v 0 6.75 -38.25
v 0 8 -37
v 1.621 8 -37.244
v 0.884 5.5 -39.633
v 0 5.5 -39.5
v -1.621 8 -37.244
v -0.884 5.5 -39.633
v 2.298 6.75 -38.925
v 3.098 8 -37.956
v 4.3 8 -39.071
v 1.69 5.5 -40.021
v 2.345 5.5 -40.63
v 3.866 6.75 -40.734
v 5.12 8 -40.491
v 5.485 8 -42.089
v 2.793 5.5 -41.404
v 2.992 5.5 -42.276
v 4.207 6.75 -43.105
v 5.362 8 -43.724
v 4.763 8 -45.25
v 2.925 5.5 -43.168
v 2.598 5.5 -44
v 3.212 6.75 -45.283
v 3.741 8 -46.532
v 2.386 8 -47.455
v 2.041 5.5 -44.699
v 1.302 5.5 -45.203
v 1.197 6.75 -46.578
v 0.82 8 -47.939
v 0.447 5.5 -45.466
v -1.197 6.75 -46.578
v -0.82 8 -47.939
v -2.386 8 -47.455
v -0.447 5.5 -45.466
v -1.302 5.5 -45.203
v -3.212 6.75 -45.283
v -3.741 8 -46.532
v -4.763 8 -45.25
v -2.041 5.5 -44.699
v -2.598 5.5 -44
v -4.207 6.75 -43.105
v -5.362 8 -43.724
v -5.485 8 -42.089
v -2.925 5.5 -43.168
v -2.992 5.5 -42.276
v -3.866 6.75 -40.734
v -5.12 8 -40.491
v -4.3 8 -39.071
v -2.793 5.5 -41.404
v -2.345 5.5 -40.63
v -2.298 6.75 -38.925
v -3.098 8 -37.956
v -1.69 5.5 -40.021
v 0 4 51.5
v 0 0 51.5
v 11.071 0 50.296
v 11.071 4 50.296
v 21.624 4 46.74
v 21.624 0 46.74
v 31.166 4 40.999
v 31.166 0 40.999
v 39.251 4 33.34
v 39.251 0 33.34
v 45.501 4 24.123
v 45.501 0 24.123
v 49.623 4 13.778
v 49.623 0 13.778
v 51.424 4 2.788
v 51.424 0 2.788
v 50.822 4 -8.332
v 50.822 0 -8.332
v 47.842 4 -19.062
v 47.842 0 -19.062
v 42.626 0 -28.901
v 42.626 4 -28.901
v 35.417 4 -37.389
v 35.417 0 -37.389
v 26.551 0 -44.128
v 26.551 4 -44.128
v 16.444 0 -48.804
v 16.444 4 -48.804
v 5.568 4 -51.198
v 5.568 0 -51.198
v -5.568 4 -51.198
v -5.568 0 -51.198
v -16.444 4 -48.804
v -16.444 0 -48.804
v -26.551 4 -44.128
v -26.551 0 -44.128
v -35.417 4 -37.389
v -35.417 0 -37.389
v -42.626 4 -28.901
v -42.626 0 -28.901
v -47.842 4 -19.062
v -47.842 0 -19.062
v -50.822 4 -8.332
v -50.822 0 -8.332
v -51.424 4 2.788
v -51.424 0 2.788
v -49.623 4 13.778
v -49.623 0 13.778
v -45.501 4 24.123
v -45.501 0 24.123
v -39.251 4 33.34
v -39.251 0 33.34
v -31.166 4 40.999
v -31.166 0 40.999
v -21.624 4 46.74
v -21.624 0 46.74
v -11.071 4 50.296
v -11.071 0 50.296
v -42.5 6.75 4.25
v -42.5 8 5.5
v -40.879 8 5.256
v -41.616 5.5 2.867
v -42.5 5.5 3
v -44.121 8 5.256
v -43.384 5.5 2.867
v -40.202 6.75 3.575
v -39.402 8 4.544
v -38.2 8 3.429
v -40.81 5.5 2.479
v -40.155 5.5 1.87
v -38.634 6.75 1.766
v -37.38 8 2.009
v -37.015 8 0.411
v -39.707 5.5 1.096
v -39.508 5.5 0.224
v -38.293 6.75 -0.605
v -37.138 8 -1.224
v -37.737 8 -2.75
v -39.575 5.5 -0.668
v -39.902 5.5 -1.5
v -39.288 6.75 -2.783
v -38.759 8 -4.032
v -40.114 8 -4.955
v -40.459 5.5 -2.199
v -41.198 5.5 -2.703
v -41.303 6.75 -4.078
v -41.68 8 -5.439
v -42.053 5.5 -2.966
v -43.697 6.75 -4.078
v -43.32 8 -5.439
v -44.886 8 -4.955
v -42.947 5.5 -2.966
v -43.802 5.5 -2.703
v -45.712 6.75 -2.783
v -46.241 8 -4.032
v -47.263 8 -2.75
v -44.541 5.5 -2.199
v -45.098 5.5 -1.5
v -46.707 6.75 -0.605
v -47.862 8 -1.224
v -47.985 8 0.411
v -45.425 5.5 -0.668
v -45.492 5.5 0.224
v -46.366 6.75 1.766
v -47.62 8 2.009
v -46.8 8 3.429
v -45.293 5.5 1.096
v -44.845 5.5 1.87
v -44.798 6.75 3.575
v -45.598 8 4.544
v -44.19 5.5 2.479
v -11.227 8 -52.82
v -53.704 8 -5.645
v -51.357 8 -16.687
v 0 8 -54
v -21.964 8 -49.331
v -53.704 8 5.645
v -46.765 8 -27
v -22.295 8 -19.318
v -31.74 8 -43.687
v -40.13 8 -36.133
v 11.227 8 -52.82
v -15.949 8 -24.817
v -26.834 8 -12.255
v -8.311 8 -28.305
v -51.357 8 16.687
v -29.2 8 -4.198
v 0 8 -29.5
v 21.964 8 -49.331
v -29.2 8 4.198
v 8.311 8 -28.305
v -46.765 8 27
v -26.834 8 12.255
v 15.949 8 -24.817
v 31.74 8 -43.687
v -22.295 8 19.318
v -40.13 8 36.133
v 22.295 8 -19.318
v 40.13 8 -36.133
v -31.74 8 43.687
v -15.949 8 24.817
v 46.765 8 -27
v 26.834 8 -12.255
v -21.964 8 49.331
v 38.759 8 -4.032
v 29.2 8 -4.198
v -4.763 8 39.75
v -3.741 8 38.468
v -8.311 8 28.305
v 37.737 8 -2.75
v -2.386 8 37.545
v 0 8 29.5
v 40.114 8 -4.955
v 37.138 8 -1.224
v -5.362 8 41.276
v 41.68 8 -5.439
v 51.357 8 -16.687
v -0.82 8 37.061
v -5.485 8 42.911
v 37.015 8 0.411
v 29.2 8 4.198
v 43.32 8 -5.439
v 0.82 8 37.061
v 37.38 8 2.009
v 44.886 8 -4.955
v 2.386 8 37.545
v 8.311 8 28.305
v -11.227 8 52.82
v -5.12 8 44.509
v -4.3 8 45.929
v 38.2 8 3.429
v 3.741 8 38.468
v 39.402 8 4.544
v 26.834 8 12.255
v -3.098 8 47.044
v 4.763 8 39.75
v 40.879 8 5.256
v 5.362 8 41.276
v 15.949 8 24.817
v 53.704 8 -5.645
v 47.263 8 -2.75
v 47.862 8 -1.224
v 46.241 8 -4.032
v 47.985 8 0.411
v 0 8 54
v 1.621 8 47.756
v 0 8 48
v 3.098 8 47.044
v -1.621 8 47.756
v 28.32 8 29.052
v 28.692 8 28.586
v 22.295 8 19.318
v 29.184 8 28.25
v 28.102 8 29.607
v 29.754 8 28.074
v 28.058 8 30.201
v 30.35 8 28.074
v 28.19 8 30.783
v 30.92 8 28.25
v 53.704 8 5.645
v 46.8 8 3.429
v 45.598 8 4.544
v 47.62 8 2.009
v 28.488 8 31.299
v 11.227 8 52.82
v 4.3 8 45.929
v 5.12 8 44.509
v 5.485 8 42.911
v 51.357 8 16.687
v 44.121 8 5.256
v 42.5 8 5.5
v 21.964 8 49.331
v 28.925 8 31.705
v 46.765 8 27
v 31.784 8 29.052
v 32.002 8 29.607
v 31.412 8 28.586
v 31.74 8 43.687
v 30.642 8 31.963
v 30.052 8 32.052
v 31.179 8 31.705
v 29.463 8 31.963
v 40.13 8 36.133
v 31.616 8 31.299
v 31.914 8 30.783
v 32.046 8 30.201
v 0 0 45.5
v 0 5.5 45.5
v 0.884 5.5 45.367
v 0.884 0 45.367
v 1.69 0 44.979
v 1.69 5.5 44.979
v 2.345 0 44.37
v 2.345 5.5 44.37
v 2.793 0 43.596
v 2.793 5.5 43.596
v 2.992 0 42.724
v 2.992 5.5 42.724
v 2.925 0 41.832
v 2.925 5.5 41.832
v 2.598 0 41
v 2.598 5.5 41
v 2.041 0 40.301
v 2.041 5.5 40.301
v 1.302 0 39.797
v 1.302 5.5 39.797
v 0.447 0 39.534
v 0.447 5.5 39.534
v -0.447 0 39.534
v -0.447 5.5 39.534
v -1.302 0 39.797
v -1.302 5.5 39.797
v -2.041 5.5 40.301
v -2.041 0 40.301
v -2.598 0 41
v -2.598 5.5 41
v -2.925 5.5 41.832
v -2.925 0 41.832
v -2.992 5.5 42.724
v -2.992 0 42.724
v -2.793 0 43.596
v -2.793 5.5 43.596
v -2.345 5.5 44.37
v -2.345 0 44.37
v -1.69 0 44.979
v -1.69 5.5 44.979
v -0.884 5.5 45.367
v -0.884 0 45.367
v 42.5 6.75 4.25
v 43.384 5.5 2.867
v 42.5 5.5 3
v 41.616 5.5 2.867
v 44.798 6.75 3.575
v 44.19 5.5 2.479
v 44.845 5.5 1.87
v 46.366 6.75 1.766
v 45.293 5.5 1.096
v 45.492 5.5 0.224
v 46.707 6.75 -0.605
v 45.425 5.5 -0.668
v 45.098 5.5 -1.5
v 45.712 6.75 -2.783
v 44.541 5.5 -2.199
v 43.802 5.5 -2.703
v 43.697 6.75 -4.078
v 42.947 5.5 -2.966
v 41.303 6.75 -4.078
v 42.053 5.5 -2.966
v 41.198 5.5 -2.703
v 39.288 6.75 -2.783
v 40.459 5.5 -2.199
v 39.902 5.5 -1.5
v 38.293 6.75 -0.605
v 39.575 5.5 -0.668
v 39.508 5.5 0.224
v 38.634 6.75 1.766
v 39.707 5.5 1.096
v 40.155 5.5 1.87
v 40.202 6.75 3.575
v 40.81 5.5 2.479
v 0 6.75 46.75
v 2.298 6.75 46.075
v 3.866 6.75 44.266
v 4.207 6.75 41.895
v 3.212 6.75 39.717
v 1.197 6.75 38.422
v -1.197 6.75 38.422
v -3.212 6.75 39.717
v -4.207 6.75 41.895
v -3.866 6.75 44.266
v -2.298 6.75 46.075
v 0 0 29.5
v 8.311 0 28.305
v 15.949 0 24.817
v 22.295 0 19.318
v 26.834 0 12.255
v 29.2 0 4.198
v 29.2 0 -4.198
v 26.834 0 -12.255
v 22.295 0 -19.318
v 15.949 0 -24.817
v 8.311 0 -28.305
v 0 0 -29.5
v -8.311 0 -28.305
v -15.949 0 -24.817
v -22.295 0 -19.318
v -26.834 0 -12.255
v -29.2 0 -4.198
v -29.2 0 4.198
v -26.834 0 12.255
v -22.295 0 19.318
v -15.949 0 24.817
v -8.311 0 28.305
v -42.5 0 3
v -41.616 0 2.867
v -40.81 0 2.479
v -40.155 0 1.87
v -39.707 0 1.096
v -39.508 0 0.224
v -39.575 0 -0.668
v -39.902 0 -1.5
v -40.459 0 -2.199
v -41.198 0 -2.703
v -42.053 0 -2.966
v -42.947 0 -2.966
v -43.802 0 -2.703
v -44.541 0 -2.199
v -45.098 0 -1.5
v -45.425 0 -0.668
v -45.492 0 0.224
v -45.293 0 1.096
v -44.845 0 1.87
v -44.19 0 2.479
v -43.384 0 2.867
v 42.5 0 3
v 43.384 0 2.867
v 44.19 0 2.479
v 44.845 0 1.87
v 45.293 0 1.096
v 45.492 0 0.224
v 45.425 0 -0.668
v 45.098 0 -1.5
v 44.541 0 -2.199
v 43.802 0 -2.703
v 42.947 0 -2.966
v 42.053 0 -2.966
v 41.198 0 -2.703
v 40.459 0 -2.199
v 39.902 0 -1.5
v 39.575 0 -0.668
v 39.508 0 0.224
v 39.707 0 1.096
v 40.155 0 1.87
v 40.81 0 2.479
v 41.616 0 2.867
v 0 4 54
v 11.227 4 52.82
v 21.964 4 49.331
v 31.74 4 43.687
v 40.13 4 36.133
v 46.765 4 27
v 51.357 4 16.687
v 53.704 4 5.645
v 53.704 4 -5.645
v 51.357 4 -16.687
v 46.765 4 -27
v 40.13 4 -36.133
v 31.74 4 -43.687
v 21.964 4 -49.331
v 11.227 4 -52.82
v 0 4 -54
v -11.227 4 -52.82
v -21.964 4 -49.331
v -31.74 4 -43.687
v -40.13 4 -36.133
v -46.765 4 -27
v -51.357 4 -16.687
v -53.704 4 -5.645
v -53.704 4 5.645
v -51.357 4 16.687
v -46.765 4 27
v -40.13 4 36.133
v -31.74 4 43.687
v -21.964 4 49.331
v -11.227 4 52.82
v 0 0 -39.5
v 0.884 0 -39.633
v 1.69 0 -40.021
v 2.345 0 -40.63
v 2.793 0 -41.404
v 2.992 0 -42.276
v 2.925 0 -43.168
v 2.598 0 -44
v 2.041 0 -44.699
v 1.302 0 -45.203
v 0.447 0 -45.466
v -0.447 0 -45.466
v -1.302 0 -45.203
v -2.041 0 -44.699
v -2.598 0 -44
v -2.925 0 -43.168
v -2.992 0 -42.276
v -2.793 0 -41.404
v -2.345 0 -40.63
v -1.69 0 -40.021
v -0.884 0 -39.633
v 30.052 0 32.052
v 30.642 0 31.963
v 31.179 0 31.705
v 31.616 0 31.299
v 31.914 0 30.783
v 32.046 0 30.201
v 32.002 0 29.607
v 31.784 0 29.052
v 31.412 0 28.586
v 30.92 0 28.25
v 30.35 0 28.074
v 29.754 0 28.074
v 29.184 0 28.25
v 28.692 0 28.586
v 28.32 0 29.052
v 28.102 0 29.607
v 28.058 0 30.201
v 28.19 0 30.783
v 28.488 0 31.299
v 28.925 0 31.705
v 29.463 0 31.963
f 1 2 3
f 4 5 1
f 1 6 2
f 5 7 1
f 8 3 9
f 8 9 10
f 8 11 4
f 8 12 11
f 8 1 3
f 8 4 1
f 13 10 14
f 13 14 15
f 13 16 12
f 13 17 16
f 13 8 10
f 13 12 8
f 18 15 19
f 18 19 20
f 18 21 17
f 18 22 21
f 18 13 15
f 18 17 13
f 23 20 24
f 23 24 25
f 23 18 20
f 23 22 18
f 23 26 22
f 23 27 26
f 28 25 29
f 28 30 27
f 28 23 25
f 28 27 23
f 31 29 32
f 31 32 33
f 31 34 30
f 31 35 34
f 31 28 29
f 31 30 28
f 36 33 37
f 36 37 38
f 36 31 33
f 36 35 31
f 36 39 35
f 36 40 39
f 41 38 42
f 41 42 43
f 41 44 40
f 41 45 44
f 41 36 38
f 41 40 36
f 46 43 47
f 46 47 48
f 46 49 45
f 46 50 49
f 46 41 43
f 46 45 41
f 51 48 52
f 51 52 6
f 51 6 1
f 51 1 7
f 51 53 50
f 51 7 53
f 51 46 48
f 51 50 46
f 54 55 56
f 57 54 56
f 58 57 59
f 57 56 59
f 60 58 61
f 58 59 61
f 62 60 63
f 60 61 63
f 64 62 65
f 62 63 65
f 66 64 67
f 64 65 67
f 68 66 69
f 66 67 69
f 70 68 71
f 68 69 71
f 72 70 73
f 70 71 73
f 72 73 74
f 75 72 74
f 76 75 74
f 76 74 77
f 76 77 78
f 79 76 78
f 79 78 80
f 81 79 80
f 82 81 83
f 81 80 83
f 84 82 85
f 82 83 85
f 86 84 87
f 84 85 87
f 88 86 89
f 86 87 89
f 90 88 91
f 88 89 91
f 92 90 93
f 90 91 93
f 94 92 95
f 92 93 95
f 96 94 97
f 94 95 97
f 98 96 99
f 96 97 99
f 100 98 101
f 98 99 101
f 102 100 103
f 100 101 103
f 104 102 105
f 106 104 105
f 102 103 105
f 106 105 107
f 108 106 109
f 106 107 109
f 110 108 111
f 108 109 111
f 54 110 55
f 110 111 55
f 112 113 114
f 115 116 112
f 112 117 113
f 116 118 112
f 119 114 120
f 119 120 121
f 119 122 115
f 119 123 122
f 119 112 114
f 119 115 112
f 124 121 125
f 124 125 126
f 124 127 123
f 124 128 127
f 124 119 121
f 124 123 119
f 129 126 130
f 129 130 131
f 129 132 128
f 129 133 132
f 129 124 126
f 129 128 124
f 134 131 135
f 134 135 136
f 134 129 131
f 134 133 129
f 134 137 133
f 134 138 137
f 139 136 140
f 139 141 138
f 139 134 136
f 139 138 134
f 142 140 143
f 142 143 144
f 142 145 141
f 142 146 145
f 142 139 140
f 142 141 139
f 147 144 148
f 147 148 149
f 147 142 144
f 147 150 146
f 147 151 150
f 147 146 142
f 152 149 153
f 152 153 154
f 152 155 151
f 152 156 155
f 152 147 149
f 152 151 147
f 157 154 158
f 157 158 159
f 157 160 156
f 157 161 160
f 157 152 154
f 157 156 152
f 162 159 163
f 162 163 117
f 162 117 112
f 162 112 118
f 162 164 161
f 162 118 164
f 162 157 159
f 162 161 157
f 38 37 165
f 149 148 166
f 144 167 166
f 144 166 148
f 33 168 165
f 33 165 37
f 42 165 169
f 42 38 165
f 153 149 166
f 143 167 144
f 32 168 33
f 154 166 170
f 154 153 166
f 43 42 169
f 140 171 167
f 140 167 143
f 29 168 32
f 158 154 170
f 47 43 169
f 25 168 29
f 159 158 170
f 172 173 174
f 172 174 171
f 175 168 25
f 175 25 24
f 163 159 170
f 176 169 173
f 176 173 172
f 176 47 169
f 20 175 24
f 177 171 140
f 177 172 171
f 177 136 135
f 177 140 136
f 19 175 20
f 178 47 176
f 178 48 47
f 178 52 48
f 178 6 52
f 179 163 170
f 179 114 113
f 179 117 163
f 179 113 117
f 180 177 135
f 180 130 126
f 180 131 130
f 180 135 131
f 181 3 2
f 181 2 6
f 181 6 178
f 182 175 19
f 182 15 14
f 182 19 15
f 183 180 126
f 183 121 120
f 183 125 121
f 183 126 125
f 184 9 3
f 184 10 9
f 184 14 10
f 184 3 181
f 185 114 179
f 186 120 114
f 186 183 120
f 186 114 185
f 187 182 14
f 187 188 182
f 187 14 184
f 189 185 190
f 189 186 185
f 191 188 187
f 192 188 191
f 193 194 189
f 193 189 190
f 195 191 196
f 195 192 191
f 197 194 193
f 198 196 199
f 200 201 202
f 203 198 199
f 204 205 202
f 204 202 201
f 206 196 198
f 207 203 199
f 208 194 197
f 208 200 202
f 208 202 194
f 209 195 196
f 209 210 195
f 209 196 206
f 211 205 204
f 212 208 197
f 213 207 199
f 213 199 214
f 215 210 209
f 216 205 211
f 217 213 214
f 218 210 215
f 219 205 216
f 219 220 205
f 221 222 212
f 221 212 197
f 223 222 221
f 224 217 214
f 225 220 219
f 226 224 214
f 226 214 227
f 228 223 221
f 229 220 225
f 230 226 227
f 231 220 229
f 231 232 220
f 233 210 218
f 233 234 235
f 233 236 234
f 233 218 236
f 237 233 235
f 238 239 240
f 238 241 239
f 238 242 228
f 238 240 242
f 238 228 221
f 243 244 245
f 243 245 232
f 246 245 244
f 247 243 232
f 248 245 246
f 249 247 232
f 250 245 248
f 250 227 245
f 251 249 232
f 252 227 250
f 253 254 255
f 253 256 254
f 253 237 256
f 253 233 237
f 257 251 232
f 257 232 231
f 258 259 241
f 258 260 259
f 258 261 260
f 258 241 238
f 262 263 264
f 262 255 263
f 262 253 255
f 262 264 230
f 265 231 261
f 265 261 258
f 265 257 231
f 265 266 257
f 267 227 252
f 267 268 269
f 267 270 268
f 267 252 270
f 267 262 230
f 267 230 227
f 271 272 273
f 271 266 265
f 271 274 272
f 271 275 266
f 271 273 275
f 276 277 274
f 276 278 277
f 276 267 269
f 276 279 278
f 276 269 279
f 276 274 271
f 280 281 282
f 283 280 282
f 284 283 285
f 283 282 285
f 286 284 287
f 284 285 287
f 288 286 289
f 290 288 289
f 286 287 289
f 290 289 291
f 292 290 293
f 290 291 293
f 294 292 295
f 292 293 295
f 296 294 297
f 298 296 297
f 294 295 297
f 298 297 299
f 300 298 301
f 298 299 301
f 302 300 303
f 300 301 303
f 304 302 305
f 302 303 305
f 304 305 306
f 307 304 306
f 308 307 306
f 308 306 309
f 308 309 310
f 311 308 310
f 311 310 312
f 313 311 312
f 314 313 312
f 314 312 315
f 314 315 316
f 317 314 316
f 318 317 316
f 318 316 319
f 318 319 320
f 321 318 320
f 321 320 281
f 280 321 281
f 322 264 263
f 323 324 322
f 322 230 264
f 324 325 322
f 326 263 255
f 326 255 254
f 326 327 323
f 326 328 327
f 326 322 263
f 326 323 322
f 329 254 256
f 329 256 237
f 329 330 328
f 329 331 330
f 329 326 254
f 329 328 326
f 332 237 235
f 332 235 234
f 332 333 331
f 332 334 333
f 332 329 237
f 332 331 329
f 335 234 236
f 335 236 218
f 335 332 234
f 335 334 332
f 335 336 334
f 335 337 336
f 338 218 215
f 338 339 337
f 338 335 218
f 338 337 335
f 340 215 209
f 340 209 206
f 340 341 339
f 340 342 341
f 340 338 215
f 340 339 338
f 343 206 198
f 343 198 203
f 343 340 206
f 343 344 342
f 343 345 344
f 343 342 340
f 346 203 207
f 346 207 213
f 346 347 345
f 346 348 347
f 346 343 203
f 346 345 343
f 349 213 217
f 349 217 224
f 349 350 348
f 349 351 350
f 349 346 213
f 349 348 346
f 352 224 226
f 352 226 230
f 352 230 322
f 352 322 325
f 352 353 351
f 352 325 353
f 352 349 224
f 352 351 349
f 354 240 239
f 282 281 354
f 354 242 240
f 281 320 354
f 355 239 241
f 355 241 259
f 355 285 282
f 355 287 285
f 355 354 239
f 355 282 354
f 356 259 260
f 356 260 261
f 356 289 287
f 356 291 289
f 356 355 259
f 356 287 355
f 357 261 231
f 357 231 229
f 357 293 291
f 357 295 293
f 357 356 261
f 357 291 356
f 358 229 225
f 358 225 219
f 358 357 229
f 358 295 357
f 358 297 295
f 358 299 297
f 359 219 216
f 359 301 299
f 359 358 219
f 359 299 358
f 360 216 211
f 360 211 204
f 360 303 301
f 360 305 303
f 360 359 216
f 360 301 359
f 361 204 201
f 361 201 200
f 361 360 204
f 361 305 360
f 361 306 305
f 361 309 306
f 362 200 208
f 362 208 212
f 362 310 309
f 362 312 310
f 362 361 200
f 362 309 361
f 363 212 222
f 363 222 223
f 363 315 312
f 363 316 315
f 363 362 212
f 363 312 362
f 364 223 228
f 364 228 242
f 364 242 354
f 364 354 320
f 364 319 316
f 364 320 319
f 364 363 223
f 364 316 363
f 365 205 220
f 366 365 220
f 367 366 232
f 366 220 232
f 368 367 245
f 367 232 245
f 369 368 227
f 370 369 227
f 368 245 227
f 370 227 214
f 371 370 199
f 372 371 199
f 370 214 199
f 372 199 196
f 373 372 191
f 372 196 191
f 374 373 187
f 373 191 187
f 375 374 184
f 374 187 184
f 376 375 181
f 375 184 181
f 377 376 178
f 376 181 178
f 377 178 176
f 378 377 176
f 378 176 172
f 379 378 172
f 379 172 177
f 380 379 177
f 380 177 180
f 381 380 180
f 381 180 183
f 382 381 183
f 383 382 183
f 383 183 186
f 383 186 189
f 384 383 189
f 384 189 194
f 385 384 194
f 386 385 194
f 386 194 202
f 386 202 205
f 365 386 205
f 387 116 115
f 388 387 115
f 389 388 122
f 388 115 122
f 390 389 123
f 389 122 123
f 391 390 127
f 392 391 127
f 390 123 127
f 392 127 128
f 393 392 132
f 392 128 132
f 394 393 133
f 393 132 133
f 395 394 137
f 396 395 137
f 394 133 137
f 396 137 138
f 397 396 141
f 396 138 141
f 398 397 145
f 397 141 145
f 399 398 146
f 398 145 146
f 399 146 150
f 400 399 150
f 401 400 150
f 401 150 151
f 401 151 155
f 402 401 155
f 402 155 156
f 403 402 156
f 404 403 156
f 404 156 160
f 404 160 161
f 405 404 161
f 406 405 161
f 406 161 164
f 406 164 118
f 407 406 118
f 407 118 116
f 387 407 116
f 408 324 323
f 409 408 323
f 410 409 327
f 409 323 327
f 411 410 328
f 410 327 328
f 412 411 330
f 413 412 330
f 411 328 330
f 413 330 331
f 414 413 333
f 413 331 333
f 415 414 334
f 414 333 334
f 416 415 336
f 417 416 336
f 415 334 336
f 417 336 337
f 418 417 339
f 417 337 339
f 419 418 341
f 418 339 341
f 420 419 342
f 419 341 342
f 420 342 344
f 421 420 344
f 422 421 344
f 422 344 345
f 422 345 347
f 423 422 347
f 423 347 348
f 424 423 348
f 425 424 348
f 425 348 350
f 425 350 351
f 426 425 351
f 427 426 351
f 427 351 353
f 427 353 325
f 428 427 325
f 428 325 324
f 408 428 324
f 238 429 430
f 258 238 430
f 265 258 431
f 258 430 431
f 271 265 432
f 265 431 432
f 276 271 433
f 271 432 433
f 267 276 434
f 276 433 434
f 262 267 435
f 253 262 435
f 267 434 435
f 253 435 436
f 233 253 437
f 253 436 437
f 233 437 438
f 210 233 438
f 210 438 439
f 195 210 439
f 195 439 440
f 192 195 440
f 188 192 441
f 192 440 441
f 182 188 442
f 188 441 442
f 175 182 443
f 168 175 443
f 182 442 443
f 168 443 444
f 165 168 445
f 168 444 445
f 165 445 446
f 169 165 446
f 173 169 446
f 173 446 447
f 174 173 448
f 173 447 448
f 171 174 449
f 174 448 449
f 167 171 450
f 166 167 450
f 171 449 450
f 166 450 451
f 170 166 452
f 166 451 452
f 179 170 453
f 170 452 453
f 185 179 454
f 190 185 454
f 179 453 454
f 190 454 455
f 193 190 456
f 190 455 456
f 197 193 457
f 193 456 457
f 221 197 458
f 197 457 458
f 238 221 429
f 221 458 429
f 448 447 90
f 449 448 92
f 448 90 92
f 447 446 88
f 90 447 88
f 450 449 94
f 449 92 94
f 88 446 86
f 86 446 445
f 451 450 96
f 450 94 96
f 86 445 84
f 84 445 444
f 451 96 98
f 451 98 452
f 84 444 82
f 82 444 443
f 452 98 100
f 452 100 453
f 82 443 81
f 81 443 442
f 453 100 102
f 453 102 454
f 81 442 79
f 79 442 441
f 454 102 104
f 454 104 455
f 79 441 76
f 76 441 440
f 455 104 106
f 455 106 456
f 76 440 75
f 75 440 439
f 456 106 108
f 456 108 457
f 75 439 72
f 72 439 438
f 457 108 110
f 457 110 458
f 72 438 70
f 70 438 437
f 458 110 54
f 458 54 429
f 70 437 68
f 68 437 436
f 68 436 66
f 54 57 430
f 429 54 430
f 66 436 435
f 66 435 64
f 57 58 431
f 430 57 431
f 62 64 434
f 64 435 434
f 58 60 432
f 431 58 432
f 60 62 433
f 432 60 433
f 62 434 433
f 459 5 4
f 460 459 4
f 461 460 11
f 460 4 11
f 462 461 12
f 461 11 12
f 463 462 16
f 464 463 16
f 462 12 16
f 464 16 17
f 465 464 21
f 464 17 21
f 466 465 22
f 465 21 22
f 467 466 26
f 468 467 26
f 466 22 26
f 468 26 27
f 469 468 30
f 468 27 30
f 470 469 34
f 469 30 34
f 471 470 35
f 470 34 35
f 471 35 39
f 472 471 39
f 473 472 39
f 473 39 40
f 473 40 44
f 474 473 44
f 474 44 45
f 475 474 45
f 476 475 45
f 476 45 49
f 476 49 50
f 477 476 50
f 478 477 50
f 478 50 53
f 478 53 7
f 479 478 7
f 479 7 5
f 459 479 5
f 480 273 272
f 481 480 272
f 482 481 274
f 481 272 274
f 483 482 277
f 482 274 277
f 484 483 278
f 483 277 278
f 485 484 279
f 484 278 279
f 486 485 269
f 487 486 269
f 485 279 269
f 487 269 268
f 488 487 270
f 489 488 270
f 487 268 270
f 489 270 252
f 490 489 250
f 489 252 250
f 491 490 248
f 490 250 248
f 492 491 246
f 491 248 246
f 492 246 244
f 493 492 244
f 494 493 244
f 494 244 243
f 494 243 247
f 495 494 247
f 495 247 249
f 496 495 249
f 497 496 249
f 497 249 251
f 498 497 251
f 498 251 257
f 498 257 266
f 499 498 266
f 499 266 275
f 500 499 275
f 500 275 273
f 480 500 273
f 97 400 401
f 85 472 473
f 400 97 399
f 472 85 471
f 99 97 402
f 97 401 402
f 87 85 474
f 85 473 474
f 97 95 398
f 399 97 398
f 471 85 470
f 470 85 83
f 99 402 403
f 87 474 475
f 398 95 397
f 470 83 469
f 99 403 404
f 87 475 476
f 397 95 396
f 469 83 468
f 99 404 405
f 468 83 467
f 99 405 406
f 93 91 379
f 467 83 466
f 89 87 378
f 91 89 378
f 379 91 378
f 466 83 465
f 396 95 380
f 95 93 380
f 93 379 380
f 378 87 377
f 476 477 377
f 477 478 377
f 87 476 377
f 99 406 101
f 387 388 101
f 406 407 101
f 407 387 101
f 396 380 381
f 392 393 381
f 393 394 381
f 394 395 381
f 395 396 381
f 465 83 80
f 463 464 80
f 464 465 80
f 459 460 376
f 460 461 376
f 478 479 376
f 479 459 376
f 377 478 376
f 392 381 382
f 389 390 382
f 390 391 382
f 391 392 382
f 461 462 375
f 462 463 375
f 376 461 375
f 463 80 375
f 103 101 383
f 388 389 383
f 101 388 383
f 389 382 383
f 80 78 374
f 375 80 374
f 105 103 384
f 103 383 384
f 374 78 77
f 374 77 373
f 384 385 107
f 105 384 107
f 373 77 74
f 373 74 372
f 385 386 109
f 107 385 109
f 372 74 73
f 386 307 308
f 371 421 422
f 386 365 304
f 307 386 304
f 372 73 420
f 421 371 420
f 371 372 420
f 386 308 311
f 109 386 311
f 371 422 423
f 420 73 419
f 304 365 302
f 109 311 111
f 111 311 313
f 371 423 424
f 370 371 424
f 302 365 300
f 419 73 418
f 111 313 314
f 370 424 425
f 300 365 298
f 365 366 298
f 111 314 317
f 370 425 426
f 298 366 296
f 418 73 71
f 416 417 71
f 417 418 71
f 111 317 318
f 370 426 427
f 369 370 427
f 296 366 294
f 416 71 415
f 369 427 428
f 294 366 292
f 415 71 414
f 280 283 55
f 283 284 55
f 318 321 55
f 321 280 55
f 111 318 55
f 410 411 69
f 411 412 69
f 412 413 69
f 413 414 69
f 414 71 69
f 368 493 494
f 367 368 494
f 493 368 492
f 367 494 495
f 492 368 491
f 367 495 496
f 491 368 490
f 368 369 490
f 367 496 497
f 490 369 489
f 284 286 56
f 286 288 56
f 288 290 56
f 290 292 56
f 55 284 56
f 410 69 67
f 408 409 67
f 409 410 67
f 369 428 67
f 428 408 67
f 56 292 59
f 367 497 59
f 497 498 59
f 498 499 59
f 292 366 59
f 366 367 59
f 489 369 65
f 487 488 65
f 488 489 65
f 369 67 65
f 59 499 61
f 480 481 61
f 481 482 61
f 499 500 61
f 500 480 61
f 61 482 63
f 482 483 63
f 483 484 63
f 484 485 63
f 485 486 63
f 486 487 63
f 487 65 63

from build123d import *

# Parameters (mm, degrees)
SKETCH_1_R          = 51.5
EXTRUDE_1_DEPTH     = 4
SKETCH_2_R          = 54
EXTRUDE_2_DEPTH     = 4
SKETCH_3_R          = 29.5
CUT_EXTRUDE_1_DEPTH = 10
SKETCH_4_R          = 3
CUT_EXTRUDE_2_DEPTH = 10
CHAMFER_2_SIZE      = 2.5
SKETCH_5_R          = 2
CUT_EXTRUDE_3_DEPTH = 10


with BuildPart() as part:
    # Эскиз1 → Бобышка-Вытянуть1 (new body)
    with BuildSketch(Plane(origin=(0, 0, 0), x_dir=(1, 0, 0), z_dir=(0, 1, 0))):
        with Locations(Location((0, 0, 0), (0, 0, 270))):
            Circle(SKETCH_1_R)
    extrude(amount=EXTRUDE_1_DEPTH)

    # Эскиз2 → Бобышка-Вытянуть2 (add)
    with BuildSketch(Plane(origin=(0, 4, 0), x_dir=(1, 0, 0), z_dir=(0, 1, 0))):
        with Locations(Location((0, 0, 0), (0, 0, 270))):
            Circle(SKETCH_2_R)
    extrude(amount=EXTRUDE_2_DEPTH)

    # Эскиз3 → Вырез-Вытянуть1 (cut)
    with BuildSketch(Plane(origin=(0, 8, 0), x_dir=(1, 0, 0), z_dir=(0, 1, 0))):
        with Locations(Location((0, 0, 0), (0, 0, 270))):
            Circle(SKETCH_3_R)
    extrude(amount=-CUT_EXTRUDE_1_DEPTH, mode=Mode.SUBTRACT)

    # Эскиз4 → Вырез-Вытянуть2 (cut)
    with BuildSketch(Plane(origin=(0, 8, 0), x_dir=(1, 0, 0), z_dir=(0, 1, 0))):
        with Locations(Location((0, 42.5, 0), (0, 0, 270))):
            Circle(SKETCH_4_R)
        with Locations(Location((-42.5, 0, 0), (0, 0, 270))):
            Circle(SKETCH_4_R)
        with Locations(Location((0, -42.5, 0), (0, 0, 270))):
            Circle(SKETCH_4_R)
        with Locations(Location((42.5, 0, 0), (0, 0, 270))):
            Circle(SKETCH_4_R)
    extrude(amount=-CUT_EXTRUDE_2_DEPTH, mode=Mode.SUBTRACT)

    # Фаска2
    chamfer_2_edges = [part.edges().sort_by_distance(p)[0] for p in [
        (0, 8, -45.5),
        (-42.5, 8, -3),
        (0, 8, 39.5),
        (42.5, 8, -3),
    ]]
    chamfer(chamfer_2_edges, length=CHAMFER_2_SIZE)

    # Эскиз5 → Вырез-Вытянуть3 (cut)
    with BuildSketch(Plane(origin=(0, 8, 0), x_dir=(1, 0, 0), z_dir=(0, 1, 0))):
        with Locations(Location((30.0520382, -30.0520382, 0), (0, 0, 270))):
            Circle(SKETCH_5_R)
    extrude(amount=-CUT_EXTRUDE_3_DEPTH, mode=Mode.SUBTRACT)


solid = part.part
